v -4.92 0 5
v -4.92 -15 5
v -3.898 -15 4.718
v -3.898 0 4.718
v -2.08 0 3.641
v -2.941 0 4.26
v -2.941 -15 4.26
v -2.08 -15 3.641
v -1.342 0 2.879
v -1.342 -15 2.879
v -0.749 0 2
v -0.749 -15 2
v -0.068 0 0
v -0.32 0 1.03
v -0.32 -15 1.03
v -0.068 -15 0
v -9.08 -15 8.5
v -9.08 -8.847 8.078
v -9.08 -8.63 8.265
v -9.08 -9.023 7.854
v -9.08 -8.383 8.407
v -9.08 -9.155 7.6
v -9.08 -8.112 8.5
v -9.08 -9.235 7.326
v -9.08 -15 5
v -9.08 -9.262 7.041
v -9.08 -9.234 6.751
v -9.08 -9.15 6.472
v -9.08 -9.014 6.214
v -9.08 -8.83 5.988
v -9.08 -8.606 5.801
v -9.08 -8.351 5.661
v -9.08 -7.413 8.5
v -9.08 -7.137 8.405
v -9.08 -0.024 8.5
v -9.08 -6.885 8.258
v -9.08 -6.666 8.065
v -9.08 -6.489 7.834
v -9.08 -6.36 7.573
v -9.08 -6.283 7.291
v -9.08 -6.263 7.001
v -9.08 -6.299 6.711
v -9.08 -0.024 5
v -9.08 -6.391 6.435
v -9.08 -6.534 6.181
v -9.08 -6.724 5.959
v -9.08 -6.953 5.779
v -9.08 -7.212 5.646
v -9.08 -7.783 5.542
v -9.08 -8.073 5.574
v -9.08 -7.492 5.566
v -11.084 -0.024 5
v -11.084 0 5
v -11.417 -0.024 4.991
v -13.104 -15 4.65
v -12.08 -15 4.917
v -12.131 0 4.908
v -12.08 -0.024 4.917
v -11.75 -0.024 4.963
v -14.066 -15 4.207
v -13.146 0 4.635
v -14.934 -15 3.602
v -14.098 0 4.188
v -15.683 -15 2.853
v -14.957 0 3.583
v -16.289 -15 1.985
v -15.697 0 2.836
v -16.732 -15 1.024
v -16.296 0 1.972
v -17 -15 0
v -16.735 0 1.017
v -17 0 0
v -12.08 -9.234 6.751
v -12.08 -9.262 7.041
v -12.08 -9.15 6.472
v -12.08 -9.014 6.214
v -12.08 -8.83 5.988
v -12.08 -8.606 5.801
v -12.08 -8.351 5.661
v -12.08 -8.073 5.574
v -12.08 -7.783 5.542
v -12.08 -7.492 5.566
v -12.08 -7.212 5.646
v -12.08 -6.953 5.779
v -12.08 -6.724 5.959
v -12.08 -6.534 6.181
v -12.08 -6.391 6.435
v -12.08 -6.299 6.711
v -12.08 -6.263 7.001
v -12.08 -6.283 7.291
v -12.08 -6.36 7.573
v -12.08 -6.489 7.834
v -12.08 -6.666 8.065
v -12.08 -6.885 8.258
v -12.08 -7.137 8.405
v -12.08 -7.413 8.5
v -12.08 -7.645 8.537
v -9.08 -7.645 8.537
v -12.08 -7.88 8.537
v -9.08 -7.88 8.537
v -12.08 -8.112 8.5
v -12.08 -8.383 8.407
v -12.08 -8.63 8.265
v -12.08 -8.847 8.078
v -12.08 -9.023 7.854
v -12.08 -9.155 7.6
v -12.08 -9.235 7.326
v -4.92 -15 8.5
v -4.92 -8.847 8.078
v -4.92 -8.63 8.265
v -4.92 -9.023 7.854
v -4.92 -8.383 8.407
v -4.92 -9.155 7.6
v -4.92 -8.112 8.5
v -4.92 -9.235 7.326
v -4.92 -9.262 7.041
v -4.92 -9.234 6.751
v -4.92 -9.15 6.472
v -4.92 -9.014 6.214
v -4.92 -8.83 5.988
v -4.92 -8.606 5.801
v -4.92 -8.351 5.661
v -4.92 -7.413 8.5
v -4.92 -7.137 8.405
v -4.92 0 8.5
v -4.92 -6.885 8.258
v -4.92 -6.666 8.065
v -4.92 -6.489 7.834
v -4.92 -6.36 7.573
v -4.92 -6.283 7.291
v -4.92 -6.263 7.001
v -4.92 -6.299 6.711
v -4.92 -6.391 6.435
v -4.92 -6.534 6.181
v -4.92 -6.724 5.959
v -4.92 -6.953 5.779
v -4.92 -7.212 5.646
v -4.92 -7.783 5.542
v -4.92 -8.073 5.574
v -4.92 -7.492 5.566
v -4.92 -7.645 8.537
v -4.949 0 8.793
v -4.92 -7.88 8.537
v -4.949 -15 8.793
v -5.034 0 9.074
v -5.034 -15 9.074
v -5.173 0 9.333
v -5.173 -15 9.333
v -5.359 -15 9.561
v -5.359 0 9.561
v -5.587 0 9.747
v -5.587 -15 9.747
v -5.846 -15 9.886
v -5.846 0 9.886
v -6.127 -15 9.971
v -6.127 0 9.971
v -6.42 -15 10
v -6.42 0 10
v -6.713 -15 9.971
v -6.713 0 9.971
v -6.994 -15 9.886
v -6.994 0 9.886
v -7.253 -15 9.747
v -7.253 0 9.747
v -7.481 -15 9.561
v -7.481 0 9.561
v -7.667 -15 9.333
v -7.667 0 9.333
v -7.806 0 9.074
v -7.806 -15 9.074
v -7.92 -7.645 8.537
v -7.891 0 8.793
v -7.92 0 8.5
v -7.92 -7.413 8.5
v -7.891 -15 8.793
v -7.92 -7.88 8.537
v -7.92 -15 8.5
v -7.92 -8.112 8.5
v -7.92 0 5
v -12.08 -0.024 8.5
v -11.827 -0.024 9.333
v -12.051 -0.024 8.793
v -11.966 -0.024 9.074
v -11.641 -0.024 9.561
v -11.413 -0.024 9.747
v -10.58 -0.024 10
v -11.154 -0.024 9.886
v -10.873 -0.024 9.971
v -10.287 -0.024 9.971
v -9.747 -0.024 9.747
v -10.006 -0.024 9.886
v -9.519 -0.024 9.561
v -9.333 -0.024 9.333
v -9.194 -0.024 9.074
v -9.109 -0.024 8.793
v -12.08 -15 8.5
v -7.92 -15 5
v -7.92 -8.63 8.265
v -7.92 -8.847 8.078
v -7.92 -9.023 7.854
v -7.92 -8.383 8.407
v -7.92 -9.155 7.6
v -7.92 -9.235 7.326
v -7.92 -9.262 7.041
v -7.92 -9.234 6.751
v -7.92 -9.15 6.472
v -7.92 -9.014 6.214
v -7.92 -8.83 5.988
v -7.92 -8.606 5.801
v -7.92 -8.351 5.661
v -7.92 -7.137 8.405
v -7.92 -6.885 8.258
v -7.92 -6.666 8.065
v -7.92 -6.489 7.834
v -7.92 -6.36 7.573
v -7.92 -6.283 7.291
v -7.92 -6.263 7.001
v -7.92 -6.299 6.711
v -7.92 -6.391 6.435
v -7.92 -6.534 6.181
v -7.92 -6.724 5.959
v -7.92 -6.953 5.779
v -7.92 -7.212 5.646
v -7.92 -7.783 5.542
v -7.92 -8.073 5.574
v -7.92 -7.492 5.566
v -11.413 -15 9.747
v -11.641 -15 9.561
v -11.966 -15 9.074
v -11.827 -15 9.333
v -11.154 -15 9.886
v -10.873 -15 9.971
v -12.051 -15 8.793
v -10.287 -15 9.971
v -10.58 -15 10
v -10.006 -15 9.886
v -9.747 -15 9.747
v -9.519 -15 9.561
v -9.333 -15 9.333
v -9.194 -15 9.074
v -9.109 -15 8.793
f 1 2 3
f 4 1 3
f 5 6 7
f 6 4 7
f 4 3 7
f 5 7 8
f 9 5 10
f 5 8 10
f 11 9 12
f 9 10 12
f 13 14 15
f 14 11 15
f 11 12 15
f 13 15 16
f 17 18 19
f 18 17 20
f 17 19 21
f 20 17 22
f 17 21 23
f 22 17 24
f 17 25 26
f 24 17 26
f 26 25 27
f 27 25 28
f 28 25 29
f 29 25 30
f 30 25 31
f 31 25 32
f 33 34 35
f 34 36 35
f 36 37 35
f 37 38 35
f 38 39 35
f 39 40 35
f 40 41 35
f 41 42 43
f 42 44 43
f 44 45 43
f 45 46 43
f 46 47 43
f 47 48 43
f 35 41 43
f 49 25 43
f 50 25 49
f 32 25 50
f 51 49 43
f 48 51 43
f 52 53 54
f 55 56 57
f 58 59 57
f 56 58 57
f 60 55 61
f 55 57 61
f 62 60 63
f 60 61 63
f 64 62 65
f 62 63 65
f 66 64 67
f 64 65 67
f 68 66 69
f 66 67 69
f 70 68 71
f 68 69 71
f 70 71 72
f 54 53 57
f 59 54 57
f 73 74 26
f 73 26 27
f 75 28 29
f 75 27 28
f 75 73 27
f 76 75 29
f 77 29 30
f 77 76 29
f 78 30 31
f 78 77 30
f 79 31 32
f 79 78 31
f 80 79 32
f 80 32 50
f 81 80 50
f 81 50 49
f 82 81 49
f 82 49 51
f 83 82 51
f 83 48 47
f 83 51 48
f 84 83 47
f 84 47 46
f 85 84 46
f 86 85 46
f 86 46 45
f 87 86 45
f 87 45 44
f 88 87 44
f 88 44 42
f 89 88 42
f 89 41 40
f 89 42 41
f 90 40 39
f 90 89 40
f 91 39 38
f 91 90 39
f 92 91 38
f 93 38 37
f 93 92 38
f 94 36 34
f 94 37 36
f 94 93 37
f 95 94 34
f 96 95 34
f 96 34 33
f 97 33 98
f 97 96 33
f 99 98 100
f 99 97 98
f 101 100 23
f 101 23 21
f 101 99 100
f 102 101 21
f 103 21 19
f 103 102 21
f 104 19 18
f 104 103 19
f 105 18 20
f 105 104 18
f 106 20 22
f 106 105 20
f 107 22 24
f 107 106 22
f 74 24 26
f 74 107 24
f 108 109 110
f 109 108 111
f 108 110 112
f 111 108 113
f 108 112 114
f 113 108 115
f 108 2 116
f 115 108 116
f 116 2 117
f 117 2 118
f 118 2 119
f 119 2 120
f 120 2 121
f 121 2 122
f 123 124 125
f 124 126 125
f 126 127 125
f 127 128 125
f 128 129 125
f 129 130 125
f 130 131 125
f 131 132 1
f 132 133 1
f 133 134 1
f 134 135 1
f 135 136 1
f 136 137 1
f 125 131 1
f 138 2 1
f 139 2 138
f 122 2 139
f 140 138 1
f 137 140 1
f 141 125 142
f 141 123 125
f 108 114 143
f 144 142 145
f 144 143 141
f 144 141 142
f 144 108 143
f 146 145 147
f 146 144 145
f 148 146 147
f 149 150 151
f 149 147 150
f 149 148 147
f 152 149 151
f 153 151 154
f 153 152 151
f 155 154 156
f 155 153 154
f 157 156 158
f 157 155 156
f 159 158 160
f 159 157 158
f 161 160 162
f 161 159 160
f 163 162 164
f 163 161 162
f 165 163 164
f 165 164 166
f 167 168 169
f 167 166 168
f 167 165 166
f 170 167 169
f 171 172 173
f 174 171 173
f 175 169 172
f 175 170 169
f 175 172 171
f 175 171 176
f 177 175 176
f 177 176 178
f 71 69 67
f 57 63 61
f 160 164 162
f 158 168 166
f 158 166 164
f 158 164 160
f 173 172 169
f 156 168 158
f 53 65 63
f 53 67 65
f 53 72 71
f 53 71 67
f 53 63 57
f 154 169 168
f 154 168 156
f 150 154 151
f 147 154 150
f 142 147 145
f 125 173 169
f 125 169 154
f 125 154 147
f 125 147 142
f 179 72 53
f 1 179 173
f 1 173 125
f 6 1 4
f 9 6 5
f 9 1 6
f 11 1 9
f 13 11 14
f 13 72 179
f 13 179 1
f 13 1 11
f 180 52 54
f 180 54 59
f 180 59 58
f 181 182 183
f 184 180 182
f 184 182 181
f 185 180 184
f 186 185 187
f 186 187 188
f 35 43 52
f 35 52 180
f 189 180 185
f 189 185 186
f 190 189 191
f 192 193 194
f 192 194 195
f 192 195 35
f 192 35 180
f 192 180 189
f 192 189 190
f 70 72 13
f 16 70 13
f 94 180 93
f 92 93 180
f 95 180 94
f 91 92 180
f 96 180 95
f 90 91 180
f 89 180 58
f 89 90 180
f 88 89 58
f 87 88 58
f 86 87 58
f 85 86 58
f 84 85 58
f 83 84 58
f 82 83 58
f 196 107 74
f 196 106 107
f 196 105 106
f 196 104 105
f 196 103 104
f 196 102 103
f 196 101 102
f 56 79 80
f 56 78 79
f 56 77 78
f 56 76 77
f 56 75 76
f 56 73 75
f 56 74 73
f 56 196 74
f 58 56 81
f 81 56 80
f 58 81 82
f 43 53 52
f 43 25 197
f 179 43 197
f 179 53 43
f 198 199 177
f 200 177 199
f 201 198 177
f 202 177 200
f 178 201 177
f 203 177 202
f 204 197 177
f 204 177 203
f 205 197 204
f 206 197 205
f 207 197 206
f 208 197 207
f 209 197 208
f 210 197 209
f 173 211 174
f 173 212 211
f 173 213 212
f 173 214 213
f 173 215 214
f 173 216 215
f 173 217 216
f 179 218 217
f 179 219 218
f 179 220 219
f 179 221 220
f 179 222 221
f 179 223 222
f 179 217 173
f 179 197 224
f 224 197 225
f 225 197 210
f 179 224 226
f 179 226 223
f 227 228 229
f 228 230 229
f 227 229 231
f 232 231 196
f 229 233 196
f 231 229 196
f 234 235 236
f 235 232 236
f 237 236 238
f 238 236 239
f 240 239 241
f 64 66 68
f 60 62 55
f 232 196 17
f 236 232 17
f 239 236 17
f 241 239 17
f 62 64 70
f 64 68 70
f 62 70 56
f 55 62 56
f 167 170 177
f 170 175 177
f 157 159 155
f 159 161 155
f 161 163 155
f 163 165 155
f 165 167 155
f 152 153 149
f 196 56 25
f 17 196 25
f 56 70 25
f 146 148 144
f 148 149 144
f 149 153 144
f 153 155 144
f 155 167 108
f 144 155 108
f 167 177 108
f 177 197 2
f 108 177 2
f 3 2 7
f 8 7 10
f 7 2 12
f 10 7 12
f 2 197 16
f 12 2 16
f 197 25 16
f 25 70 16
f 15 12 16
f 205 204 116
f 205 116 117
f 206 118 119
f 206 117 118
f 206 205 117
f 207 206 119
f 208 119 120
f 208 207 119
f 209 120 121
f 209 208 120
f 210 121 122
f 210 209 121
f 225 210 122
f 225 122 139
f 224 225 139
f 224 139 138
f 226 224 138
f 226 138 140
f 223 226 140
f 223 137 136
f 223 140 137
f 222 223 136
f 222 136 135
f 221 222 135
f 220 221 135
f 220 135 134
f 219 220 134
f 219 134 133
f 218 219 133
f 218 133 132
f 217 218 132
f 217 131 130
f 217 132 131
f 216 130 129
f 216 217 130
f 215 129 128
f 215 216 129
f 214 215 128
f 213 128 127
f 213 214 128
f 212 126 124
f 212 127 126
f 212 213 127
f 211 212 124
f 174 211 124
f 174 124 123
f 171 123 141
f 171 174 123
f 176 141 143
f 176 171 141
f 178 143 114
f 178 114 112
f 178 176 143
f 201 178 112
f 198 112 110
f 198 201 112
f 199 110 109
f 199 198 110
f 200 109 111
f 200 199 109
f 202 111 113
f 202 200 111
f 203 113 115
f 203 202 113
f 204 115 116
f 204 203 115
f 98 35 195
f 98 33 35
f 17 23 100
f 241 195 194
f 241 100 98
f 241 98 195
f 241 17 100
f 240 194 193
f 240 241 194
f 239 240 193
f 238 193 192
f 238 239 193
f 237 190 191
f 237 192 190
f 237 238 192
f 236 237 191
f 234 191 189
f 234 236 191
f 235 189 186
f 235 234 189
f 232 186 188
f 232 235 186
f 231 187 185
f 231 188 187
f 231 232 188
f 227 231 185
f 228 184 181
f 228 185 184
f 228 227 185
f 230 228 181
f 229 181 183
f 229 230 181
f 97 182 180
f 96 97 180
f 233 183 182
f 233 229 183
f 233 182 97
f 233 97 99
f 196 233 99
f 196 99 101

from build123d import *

# Parameters (mm, degrees)
SKETCH1_W               = 17
SKETCH1_H               = 15
BOSS_EXTRUDE1_DEPTH     = 5
SKETCH2_W               = 3
SKETCH2_H               = 15
SKETCH2_H_2             = 14.97636143
BOSS_EXTRUDE2_DEPTH     = 5
CUT_EXTRUDE2_DEPTH      = 21.185301583
CUT_EXTRUDE2_DEPTH_BACK = 21.185301583
SKETCH4_R               = 1.5
FILLET1_R               = 6
FILLET3_RADIUS          = 1.5
FILLET3_LENGTH          = 14.97636143
FILLET4_RADIUS          = 1.5
FILLET4_LENGTH          = 15


with BuildPart() as part:
    # Sketch1 → Boss-Extrude1 (new body)
    with BuildSketch(Plane.XY):
        with Locations((-8.5, -7.5)):
            Rectangle(SKETCH1_W, SKETCH1_H)
    extrude(amount=BOSS_EXTRUDE1_DEPTH)

    # Sketch2 → Boss-Extrude2 (add)
    with BuildSketch(Plane.XY.offset(5)):
        with Locations((-6.42, -7.5)):
            Rectangle(SKETCH2_W, SKETCH2_H)
        with Locations((-10.58, -7.511819285)):
            Rectangle(SKETCH2_W, SKETCH2_H_2)
    extrude(amount=BOSS_EXTRUDE2_DEPTH)

    # Sketch4 → Cut-Extrude2 (cut, two sides: drawn at the far end of the back side and taken through both)
    with BuildSketch(Plane(origin=(-9.08, 0, 0), x_dir=(0, 0, -1), z_dir=(1, 0, 0)).offset(-CUT_EXTRUDE2_DEPTH_BACK)):
        with Locations(Location((-7.041389116, -7.762480296, 0), (0, 0, 270))):
            Circle(SKETCH4_R)
    extrude(amount=CUT_EXTRUDE2_DEPTH + CUT_EXTRUDE2_DEPTH_BACK, mode=Mode.SUBTRACT)

    # Fillet1
    # the kernel refuses this fillet: 6 mm, written as the material it takes off along each edge
    with BuildSketch(Plane(origin=(0, -29.754999153, 5), x_dir=(0, 0, -1), z_dir=(0, 1, 0))) as fillet1_piece_1:
        with BuildLine():
            CenterArc((5.901999661, 6), FILLET1_R, 190.369759805, 79.630240195)
            Line((0, 4.92), (0, 0))
            Line((0, 0), (5.901999661, 0))
        make_face()
    extrude(amount=44.509998306, mode=Mode.SUBTRACT)
    # the kernel refuses this fillet: 6 mm, written as the material it takes off along each edge
    with BuildSketch(Plane(origin=(-17, 14.790199458, 5), x_dir=(0, 0, -1), z_dir=(0, -1, 0))) as fillet1_2_piece_1_section:
        with BuildLine():
            CenterArc((6, 5.916079783), FILLET1_R, 180, 80.405931773)
            Line((0, 5.916079783), (0, 0))
            Line((0, 0), (5, 0))
        make_face()
    fillet1_2_piece_1 = extrude(amount=44.580398916, mode=Mode.PRIVATE)
    fillet1_2_piece_1 = split(fillet1_2_piece_1, bisect_by=Plane(origin=(-17, -0.02363857, 5), z_dir=(0, 1, 0)), keep=Keep.TOP, mode=Mode.PRIVATE)
    fillet1_2_piece_1 = split(fillet1_2_piece_1, bisect_by=Plane(origin=(-12.08, 14.790199458, 5), z_dir=(-1, 0, 0)), keep=Keep.TOP, mode=Mode.PRIVATE)
    add(fillet1_2_piece_1, mode=Mode.SUBTRACT)
    with BuildSketch(Plane(origin=(-17, 14.790199458, 5), x_dir=(0, 0, -1), z_dir=(0, -1, 0))) as fillet1_2_piece_2_section:
        with BuildLine():
            CenterArc((6, 5.916079783), FILLET1_R, 180, 80.405931773)
            Line((0, 5.916079783), (0, 0))
            Line((0, 0), (5, 0))
        make_face()
    fillet1_2_piece_2 = extrude(amount=44.580398916, mode=Mode.PRIVATE)
    fillet1_2_piece_2 = split(fillet1_2_piece_2, bisect_by=Plane(origin=(-17, -0.02363857, 5), z_dir=(0, 1, 0)), keep=Keep.TOP, mode=Mode.PRIVATE)
    fillet1_2_piece_2 = split(fillet1_2_piece_2, bisect_by=Plane(origin=(-12.08, 14.790199458, 5), z_dir=(1, 0, 0)), keep=Keep.TOP, mode=Mode.PRIVATE)
    add(fillet1_2_piece_2, mode=Mode.SUBTRACT)
    with BuildSketch(Plane(origin=(-17, 14.790199458, 5), x_dir=(0, 0, -1), z_dir=(0, -1, 0))) as fillet1_2_piece_3_section:
        with BuildLine():
            CenterArc((6, 5.916079783), FILLET1_R, 180, 80.405931773)
            Line((0, 5.916079783), (0, 0))
            Line((0, 0), (5, 0))
        make_face()
    fillet1_2_piece_3 = extrude(amount=44.580398916, mode=Mode.PRIVATE)
    fillet1_2_piece_3 = split(fillet1_2_piece_3, bisect_by=Plane(origin=(-17, -0.02363857, 5), z_dir=(0, -1, 0)), keep=Keep.TOP, mode=Mode.PRIVATE)
    fillet1_2_piece_3 = split(fillet1_2_piece_3, bisect_by=Plane(origin=(-12.08, 14.790199458, 5), z_dir=(-1, 0, 0)), keep=Keep.TOP, mode=Mode.PRIVATE)
    add(fillet1_2_piece_3, mode=Mode.SUBTRACT)

    # Fillet3: full round fillet: the end face becomes a half cylinder, R = half its width
    fillet3_face = Plane((-10.58, -7.511819285, 10), x_dir=(0, -1, 0), z_dir=(0, 0, 1))  # on the end face: x along it, z out of the body
    fillet3_slab = fillet3_face.offset(-FILLET3_RADIUS / 2) * Box(FILLET3_LENGTH, 2 * FILLET3_RADIUS, FILLET3_RADIUS, mode=Mode.PRIVATE)  # the body's end, R deep
    fillet3_round = Plane((-10.58, -7.511819285, 8.5), x_dir=(0, 0, 1), z_dir=(0, -1, 0)) * Cylinder(FILLET3_RADIUS, FILLET3_LENGTH, mode=Mode.PRIVATE)  # its axis R under the face
    add(fillet3_slab - fillet3_round, mode=Mode.SUBTRACT)

    # Fillet4: full round fillet: the end face becomes a half cylinder, R = half its width
    fillet4_face = Plane((-6.42, -7.5, 10), x_dir=(0, -1, 0), z_dir=(0, 0, 1))  # on the end face: x along it, z out of the body
    fillet4_slab = fillet4_face.offset(-FILLET4_RADIUS / 2) * Box(FILLET4_LENGTH, 2 * FILLET4_RADIUS, FILLET4_RADIUS, mode=Mode.PRIVATE)  # the body's end, R deep
    fillet4_round = Plane((-6.42, -7.5, 8.5), x_dir=(0, 0, 1), z_dir=(0, -1, 0)) * Cylinder(FILLET4_RADIUS, FILLET4_LENGTH, mode=Mode.PRIVATE)  # its axis R under the face
    add(fillet4_slab - fillet4_round, mode=Mode.SUBTRACT)


solid = part.part
